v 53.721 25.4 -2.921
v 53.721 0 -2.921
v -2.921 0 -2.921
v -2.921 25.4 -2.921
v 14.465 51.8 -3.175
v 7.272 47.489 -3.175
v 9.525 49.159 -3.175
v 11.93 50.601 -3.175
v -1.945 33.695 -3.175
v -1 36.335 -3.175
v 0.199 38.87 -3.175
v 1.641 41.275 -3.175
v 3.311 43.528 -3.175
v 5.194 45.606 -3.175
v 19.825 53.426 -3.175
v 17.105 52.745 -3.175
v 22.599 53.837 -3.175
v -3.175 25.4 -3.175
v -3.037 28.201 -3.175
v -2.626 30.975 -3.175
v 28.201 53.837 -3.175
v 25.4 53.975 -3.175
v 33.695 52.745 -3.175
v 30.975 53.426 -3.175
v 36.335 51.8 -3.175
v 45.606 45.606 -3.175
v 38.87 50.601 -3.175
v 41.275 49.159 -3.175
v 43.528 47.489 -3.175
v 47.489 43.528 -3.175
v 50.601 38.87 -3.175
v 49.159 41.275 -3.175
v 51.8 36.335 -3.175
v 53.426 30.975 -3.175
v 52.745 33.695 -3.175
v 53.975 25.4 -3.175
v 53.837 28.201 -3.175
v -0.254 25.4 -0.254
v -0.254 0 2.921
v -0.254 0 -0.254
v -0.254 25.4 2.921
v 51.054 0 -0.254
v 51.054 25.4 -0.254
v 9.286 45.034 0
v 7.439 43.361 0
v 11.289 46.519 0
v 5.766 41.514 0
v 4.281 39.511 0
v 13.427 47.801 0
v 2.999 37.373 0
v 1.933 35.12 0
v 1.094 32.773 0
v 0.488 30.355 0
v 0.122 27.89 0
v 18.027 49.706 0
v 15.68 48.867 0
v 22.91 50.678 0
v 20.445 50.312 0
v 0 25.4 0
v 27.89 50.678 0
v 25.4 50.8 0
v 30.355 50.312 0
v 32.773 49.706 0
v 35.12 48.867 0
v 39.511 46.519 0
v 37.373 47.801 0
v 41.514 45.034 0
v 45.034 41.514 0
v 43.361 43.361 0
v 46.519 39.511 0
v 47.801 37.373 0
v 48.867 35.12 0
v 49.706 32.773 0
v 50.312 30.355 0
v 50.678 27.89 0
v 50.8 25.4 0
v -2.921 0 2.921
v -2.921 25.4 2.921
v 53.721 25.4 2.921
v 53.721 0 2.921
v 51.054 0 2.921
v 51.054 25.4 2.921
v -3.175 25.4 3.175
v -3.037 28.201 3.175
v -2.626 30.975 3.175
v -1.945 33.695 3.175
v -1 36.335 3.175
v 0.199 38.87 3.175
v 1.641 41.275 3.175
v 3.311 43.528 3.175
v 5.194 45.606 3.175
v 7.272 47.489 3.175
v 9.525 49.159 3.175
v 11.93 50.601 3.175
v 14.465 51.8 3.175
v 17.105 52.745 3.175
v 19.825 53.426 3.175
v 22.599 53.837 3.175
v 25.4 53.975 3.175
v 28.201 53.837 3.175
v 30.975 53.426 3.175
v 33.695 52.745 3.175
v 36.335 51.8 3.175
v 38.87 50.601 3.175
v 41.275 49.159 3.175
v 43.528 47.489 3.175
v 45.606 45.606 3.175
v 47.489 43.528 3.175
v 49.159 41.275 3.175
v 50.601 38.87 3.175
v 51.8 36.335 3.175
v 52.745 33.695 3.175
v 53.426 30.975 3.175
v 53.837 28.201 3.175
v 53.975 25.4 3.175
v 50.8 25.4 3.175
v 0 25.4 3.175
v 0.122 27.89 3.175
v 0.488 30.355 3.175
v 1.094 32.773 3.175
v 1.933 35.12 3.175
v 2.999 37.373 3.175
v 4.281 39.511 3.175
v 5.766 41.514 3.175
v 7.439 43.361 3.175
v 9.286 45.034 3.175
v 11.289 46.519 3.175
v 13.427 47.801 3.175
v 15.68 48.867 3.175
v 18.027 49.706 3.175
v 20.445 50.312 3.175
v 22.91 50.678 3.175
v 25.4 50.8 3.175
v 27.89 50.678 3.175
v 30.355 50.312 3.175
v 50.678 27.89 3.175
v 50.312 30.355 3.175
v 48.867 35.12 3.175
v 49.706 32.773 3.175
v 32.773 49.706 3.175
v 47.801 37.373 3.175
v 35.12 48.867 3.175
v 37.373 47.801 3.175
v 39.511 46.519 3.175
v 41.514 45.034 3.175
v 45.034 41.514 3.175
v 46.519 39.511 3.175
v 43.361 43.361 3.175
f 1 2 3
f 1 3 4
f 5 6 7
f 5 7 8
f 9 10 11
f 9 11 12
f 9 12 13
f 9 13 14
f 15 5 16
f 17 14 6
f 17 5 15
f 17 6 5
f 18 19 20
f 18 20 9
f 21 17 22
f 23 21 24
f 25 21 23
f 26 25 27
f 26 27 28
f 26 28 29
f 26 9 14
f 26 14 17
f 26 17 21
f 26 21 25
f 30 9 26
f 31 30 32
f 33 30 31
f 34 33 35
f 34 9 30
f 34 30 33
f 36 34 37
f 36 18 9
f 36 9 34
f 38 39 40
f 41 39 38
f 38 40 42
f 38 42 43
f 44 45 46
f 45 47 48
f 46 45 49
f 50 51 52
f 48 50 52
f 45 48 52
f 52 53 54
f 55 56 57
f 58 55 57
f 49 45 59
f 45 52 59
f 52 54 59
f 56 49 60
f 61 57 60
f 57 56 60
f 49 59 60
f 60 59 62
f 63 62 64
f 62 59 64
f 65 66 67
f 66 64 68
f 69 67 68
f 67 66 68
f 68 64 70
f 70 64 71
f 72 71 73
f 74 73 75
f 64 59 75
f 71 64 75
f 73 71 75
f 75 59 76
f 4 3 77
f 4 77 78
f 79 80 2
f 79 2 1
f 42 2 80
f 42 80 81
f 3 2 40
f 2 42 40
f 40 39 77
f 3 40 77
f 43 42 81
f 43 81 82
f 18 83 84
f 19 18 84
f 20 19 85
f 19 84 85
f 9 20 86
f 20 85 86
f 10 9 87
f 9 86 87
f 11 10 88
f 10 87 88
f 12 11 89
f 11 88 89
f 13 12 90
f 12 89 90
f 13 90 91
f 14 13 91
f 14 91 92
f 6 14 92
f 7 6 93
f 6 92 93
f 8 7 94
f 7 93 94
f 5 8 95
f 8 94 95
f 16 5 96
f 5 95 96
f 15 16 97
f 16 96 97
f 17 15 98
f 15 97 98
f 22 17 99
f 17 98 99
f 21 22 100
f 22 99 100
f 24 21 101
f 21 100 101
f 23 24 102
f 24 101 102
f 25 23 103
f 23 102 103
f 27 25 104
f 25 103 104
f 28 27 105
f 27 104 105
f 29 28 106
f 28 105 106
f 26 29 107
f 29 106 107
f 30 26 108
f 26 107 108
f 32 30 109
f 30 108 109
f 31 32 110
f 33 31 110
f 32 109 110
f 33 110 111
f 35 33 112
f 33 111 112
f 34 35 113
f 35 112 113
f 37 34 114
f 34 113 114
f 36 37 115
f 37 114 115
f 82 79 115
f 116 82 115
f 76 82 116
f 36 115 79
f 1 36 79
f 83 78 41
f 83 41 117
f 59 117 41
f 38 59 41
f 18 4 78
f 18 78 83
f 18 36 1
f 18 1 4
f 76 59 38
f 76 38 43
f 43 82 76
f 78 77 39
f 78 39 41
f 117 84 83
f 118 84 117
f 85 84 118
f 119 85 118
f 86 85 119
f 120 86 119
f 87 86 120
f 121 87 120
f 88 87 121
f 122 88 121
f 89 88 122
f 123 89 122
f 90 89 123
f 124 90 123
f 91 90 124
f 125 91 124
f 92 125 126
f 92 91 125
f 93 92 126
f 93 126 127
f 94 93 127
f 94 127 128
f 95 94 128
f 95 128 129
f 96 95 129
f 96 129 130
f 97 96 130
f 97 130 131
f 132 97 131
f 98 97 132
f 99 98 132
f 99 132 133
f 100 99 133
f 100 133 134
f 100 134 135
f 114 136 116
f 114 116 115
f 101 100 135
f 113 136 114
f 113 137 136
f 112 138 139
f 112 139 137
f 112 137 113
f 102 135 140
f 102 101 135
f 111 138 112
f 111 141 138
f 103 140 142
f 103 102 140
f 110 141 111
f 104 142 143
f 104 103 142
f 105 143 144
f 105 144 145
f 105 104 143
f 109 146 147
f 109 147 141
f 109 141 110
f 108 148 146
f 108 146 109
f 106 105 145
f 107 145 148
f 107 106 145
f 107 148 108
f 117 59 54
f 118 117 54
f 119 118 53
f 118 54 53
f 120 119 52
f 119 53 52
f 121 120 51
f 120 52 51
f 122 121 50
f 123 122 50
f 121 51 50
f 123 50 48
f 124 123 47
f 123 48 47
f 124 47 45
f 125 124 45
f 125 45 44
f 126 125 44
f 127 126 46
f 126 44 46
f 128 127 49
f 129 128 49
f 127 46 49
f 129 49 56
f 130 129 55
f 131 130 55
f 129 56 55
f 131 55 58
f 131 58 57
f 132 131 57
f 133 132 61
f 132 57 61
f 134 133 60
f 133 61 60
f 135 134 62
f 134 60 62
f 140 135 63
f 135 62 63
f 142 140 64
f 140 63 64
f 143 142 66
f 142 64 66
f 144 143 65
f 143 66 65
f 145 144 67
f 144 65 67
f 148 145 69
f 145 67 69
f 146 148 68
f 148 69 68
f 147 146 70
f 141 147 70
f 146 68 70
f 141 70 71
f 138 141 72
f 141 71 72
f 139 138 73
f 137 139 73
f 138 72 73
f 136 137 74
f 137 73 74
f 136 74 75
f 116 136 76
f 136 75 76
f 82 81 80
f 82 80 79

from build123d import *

# Parameters (mm, degrees)
F1_DEPTH = 3.175
F3_DEPTH = 3.175
F4_W     = 0.254
F4_H     = 25.4


with BuildPart() as f1:
    # F0 (on Top) → F1 (new body)
    with BuildSketch(Plane.XY):
        with BuildLine():
            Line((-3.175, 0), (0, 0))
            Line((0, 0), (0, 25.4))
            ThreePointArc((0, 25.4), (25.4, 50.8), (50.8, 25.4))
            Line((50.8, 25.4), (50.8, 0))
            Line((50.8, 0), (53.975, 0))
            Line((53.975, 0), (53.975, 25.4))
            ThreePointArc((53.975, 25.4), (25.4, 53.975), (-3.175, 25.4))
            Line((-3.175, 25.4), (-3.175, 0))
        make_face()
    extrude(amount=F1_DEPTH)

    # F2 (on face) → F3 (join)
    with BuildSketch(Plane(origin=(0, 0, 0), x_dir=(1, 0, 0), z_dir=(0, 0, -1))):
        with BuildLine():
            Line((53.975, -25.4), (53.975, 0))
            Line((53.975, 0), (-3.175, 0))
            Line((-3.175, 0), (-3.175, -25.4))
            ThreePointArc((-3.175, -25.4), (25.4, -53.975), (53.975, -25.4))
        make_face()
    extrude(amount=F3_DEPTH)

    # F5: sweep along a path in F5_path
    with BuildLine(Plane(origin=(-3.175, 0, 3.175), x_dir=(0, 0, -1), z_dir=(0, 1, 0))) as f5_path:
        Line((0, 0), (6.35, 0))
        Line((6.35, 0), (6.35, -57.15))
        Line((6.35, -57.15), (0, -57.15))
        Line((0, -57.15), (0, -53.975))
        Line((0, -53.975), (3.175, -53.975))
        Line((3.175, -53.975), (3.175, -3.175))
        Line((3.175, -3.175), (0, -3.175))
        Line((0, -3.175), (0, 0))
    # F4 (on face) → F5 (sweep, cut)
    with BuildSketch(Plane.XY.offset(3.175)):
        with Locations((-3.048, 12.7)):
            Rectangle(F4_W, F4_H)
    sweep(path=f5_path.line, transition=Transition.RIGHT, mode=Mode.SUBTRACT)


solid = f1.part
